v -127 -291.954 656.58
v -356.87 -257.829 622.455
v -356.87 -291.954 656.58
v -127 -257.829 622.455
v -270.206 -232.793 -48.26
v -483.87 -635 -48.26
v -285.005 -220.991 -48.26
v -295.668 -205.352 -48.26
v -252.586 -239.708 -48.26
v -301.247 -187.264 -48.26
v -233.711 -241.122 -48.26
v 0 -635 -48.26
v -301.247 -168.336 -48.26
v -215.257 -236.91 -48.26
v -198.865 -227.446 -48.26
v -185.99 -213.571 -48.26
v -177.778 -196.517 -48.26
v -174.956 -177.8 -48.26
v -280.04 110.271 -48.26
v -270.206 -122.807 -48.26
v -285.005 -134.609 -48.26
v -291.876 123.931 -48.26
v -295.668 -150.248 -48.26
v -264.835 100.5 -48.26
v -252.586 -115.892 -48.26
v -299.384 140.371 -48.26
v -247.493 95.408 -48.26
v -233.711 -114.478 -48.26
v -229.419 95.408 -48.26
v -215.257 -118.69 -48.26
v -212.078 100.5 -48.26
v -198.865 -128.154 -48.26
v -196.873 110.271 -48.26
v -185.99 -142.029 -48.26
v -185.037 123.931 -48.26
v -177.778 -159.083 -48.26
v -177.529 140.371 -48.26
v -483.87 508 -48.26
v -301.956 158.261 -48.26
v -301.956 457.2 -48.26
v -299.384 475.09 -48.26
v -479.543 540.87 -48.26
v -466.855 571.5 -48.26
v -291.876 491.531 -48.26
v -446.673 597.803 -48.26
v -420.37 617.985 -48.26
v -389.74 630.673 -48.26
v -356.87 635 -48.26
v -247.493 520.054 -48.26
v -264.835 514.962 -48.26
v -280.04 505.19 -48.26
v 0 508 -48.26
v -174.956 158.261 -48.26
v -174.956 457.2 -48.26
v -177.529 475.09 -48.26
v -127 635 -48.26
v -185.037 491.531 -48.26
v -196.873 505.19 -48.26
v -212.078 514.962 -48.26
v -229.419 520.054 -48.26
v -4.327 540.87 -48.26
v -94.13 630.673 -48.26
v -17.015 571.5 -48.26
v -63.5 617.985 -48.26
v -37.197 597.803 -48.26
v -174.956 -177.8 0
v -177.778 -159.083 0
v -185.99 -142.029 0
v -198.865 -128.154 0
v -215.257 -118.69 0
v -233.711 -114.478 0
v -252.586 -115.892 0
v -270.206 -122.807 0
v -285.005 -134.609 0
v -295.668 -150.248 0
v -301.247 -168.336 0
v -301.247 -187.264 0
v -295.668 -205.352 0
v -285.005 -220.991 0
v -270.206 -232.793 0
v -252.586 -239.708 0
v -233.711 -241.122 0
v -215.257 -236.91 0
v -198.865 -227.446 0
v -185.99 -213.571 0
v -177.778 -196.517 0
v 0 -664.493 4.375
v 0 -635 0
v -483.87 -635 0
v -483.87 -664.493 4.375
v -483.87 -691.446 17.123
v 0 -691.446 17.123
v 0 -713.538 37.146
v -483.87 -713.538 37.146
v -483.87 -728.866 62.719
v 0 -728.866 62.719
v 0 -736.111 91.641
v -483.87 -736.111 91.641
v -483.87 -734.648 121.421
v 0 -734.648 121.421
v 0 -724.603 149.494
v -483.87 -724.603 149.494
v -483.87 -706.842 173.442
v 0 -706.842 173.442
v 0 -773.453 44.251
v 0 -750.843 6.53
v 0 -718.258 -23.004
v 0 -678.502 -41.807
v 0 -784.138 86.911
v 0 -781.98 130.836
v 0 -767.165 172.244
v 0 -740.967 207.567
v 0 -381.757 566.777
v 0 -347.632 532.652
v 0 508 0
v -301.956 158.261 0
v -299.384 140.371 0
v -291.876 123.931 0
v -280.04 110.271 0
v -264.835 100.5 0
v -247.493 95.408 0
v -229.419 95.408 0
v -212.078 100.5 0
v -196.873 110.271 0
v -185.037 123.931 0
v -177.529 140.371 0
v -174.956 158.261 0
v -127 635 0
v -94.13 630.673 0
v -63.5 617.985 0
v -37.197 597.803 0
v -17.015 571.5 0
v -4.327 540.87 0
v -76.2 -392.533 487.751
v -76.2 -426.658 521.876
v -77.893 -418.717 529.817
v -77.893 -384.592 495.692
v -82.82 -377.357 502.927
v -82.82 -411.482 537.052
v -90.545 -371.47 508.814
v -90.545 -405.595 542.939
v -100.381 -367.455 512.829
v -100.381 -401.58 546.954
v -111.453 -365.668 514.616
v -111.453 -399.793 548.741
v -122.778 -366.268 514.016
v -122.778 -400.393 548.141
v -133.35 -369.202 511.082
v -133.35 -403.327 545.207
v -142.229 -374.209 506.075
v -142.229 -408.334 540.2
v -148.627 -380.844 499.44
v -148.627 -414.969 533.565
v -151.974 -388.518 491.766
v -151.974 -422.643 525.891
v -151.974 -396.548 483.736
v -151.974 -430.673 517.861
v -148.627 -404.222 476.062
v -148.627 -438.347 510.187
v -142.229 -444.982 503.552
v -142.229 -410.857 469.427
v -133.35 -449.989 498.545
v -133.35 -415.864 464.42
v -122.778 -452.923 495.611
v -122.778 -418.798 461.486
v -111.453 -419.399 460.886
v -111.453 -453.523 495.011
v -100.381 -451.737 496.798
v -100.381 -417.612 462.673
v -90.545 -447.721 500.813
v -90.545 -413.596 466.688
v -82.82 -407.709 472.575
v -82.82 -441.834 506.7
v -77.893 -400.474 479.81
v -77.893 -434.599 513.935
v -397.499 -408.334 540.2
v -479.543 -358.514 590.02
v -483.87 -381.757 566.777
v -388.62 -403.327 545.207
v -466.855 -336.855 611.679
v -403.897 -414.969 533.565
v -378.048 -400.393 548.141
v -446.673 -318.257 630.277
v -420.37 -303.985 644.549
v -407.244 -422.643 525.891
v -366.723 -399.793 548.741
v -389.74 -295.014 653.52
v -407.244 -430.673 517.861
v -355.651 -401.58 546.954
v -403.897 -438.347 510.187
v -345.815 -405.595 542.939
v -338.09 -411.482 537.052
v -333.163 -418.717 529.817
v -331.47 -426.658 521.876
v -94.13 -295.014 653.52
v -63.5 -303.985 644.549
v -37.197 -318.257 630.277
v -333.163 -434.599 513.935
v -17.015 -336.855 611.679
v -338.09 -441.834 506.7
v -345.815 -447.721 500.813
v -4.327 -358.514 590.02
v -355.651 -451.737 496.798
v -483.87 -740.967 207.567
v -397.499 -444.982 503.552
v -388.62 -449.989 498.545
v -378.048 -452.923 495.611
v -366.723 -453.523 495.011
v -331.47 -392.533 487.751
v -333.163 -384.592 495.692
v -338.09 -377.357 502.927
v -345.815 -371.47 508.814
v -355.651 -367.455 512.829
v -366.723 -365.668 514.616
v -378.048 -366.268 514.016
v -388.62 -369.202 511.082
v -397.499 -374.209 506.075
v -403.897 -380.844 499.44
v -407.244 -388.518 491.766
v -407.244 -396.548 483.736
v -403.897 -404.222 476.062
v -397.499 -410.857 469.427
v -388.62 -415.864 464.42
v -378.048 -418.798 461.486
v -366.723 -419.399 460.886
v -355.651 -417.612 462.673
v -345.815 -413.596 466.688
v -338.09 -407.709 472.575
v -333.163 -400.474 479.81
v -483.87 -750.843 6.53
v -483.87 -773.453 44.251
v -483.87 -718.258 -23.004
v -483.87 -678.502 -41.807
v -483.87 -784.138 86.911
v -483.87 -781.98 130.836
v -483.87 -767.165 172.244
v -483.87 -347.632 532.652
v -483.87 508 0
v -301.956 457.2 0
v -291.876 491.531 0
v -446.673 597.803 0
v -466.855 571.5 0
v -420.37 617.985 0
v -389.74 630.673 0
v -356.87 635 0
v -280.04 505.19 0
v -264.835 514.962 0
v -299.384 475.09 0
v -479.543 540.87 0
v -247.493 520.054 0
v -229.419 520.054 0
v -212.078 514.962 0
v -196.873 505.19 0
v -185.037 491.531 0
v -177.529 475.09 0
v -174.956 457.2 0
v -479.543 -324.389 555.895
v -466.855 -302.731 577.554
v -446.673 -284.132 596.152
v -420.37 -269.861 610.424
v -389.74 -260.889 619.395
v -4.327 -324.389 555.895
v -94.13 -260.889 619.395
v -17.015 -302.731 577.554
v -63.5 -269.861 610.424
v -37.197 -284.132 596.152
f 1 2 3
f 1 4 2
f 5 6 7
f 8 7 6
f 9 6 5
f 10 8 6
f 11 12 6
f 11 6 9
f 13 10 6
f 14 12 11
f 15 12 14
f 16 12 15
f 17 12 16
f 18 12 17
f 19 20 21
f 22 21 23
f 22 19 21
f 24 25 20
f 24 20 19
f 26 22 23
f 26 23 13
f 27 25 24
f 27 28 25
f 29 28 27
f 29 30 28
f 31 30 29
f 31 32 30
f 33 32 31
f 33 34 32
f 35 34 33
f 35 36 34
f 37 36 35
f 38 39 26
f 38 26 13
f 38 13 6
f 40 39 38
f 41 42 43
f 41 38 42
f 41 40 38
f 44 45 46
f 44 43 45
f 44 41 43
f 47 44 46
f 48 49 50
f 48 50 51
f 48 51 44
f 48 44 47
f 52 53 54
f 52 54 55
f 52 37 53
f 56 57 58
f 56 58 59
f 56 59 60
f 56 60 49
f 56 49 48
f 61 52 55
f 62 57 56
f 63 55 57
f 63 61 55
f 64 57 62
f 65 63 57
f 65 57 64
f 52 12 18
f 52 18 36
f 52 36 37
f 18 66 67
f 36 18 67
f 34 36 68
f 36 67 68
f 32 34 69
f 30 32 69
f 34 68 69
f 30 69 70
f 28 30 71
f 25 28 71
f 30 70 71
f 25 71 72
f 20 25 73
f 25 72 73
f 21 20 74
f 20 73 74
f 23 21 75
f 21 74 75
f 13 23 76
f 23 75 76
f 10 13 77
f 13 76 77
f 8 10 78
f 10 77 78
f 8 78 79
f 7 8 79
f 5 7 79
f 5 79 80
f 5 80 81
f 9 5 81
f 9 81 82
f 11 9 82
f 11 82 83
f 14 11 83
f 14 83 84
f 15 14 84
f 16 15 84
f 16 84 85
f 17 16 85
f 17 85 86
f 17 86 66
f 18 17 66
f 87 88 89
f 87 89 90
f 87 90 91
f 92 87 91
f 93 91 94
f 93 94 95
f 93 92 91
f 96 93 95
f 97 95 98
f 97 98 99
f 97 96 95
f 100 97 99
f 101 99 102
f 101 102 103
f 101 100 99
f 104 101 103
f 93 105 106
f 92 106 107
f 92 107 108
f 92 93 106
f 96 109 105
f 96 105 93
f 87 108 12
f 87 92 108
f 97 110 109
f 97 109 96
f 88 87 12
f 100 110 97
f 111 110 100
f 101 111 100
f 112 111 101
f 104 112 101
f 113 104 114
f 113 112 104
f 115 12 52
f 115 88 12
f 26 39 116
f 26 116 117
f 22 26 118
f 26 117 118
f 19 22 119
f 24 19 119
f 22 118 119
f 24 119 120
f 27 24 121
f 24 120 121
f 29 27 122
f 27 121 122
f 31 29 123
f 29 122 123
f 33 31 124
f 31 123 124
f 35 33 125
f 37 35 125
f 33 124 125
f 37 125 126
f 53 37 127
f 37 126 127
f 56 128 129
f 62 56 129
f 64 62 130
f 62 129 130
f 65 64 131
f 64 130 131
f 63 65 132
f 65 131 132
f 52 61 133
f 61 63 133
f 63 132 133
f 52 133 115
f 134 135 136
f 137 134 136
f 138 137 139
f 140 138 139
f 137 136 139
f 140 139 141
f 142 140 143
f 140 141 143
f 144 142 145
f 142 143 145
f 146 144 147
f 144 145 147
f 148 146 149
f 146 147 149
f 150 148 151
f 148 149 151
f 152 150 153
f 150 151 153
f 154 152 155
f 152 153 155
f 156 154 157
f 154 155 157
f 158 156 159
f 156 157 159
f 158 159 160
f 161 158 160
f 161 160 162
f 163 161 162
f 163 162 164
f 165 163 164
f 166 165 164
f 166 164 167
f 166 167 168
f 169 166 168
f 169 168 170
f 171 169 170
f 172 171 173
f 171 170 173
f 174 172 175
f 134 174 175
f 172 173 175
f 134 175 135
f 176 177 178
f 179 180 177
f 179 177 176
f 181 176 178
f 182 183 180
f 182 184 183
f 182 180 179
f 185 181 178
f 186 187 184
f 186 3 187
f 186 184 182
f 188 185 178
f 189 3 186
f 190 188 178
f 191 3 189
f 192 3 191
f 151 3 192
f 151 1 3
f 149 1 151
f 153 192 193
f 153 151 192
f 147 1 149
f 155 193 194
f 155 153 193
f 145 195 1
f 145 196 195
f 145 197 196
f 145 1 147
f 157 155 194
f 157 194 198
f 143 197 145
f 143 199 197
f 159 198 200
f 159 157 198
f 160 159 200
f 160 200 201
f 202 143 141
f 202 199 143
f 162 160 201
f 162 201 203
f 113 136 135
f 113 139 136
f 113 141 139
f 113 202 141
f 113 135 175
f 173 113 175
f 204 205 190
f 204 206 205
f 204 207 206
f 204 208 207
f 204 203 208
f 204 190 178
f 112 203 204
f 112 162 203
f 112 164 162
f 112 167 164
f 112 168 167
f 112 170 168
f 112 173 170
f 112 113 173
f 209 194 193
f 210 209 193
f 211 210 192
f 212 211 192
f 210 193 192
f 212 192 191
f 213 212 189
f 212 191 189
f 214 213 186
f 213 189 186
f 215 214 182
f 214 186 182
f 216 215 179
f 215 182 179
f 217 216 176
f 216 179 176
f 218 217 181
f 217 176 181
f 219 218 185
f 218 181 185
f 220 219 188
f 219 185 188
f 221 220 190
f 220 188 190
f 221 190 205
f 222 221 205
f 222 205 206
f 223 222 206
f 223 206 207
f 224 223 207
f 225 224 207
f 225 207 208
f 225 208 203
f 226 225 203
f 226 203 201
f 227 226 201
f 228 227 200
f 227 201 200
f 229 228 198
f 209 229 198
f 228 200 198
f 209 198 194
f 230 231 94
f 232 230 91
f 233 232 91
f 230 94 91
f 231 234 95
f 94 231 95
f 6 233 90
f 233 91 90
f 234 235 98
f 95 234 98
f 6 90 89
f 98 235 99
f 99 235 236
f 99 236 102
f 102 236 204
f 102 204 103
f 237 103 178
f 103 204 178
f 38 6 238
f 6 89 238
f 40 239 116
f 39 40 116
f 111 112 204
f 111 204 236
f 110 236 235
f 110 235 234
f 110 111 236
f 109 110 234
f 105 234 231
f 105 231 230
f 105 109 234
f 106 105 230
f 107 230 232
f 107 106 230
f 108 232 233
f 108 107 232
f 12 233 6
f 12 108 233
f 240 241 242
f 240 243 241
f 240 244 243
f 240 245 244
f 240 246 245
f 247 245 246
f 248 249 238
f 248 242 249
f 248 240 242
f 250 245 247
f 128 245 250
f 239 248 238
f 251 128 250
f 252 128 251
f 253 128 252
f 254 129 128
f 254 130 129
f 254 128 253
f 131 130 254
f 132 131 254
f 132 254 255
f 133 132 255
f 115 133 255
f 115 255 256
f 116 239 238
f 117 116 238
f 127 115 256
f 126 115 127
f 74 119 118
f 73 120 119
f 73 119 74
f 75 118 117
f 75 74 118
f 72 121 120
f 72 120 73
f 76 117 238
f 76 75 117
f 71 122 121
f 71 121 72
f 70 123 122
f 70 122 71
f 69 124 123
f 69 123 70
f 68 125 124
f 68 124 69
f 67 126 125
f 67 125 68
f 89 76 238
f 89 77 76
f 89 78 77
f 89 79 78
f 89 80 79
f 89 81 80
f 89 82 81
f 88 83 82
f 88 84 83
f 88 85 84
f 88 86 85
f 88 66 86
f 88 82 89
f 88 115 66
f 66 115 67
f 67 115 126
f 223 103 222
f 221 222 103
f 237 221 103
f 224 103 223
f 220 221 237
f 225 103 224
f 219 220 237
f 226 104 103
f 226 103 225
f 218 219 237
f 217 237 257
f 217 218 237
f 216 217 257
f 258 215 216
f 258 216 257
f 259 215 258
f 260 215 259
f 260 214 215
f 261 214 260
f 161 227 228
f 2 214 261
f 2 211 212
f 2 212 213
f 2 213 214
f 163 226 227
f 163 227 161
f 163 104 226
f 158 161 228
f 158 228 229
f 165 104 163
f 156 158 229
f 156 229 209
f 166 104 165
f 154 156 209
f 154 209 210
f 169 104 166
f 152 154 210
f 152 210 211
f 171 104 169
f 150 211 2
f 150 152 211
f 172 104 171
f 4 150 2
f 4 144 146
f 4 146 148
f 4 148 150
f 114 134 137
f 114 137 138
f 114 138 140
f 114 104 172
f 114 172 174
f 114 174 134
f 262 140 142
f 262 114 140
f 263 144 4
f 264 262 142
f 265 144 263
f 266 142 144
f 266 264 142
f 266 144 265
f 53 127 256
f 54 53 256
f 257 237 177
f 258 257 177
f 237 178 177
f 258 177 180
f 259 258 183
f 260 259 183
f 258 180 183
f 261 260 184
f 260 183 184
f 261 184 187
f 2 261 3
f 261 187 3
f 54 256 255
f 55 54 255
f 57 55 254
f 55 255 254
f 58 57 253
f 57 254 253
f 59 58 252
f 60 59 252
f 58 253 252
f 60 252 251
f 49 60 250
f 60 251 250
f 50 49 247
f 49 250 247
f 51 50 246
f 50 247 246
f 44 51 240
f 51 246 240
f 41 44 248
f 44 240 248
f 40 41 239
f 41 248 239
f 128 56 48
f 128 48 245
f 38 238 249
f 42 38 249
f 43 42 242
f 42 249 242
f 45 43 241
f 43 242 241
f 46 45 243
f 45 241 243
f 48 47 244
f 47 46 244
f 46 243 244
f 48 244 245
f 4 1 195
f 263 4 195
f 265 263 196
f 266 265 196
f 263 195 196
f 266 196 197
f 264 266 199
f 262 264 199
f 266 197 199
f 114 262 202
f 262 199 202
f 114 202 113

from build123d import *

# Parameters (mm, degrees)
F1_DEPTH = 483.87
F2_R     = 63.5
F3_DEPTH = 48.261
F4_R     = 38.1
F5_DEPTH = 48.26
F7_DEPTH = 48.261
F9_DEPTH = 48.26


with BuildPart() as f1:
    # F0 (on Right) → F1 (new body)
    with BuildSketch(Plane.YZ):
        with BuildLine():
            Line((635, 0), (-635, 0))
            ThreePointArc((-635, 0), (-728.866161, 62.719363), (-706.842049, 173.442049))
            Line((-706.842049, 173.442049), (-257.829243, 622.454855))
            Line((-257.829243, 622.454855), (-291.954216, 656.579828))
            Line((-291.954216, 656.579828), (-740.967022, 207.567022))
            ThreePointArc((-740.967022, 207.567022), (-773.452587, 44.251061), (-635, -48.26))
            Line((-635, -48.26), (635, -48.26))
            Line((635, -48.26), (635, 0))
        make_face()
    extrude(amount=-F1_DEPTH)

    # F2 (on face) → F3 (cut, through all)
    with BuildSketch(Plane.XY):
        with Locations((-238.456383, -177.8)):
            Circle(F2_R)
        with BuildLine():
            Line((-174.956383, 158.261293), (-174.956383, 457.2))
            ThreePointArc((-174.956383, 457.2), (-238.456383, 520.7), (-301.956383, 457.2))
            Line((-301.956383, 457.2), (-301.956383, 158.261293))
            ThreePointArc((-301.956383, 158.261293), (-238.456383, 94.761293), (-174.956383, 158.261293))
        make_face()
    extrude(amount=-F3_DEPTH, mode=Mode.SUBTRACT)

    # F4 (on face) → F5 (cut, through all)
    with BuildSketch(Plane(origin=(0, -474.267022, 474.267022), x_dir=(1, 0, 0), z_dir=(0, -0.707107, 0.707107))):
        with Locations((-369.57, 67.329243)):
            Circle(F4_R)
        with Locations((-114.3, 67.329243)):
            Circle(F4_R)
    extrude(amount=-F5_DEPTH, mode=Mode.SUBTRACT)

    # F6 (on face) → F7 (cut, through all)
    with BuildSketch(Plane.XY):
        with BuildLine():
            ThreePointArc((-127, 635), (-37.197439, 597.802561), (0, 508))
            Line((0, 508), (0, 635))
            Line((0, 635), (-127, 635))
        make_face()
        with BuildLine():
            Line((-483.87, 635), (-483.87, 508))
            ThreePointArc((-483.87, 508), (-446.672561, 597.802561), (-356.87, 635))
            Line((-356.87, 635), (-483.87, 635))
        make_face()
    extrude(amount=-F7_DEPTH, mode=Mode.SUBTRACT)

    # F8 (on face) → F9 (cut, through all)
    with BuildSketch(Plane(origin=(0, -474.267022, 474.267022), x_dir=(1, 0, 0), z_dir=(0, -0.707107, 0.707107))):
        with BuildLine():
            ThreePointArc((-483.87, 130.829243), (-446.672561, 220.631804), (-356.87, 257.829243))
            Line((-356.87, 257.829243), (-483.87, 257.829243))
            Line((-483.87, 257.829243), (-483.87, 130.829243))
        make_face()
        with BuildLine():
            Line((0, 257.829243), (-127, 257.829243))
            ThreePointArc((-127, 257.829243), (-37.197439, 220.631804), (0, 130.829243))
            Line((0, 130.829243), (0, 257.829243))
        make_face()
    extrude(amount=-F9_DEPTH, mode=Mode.SUBTRACT)


solid = f1.part
